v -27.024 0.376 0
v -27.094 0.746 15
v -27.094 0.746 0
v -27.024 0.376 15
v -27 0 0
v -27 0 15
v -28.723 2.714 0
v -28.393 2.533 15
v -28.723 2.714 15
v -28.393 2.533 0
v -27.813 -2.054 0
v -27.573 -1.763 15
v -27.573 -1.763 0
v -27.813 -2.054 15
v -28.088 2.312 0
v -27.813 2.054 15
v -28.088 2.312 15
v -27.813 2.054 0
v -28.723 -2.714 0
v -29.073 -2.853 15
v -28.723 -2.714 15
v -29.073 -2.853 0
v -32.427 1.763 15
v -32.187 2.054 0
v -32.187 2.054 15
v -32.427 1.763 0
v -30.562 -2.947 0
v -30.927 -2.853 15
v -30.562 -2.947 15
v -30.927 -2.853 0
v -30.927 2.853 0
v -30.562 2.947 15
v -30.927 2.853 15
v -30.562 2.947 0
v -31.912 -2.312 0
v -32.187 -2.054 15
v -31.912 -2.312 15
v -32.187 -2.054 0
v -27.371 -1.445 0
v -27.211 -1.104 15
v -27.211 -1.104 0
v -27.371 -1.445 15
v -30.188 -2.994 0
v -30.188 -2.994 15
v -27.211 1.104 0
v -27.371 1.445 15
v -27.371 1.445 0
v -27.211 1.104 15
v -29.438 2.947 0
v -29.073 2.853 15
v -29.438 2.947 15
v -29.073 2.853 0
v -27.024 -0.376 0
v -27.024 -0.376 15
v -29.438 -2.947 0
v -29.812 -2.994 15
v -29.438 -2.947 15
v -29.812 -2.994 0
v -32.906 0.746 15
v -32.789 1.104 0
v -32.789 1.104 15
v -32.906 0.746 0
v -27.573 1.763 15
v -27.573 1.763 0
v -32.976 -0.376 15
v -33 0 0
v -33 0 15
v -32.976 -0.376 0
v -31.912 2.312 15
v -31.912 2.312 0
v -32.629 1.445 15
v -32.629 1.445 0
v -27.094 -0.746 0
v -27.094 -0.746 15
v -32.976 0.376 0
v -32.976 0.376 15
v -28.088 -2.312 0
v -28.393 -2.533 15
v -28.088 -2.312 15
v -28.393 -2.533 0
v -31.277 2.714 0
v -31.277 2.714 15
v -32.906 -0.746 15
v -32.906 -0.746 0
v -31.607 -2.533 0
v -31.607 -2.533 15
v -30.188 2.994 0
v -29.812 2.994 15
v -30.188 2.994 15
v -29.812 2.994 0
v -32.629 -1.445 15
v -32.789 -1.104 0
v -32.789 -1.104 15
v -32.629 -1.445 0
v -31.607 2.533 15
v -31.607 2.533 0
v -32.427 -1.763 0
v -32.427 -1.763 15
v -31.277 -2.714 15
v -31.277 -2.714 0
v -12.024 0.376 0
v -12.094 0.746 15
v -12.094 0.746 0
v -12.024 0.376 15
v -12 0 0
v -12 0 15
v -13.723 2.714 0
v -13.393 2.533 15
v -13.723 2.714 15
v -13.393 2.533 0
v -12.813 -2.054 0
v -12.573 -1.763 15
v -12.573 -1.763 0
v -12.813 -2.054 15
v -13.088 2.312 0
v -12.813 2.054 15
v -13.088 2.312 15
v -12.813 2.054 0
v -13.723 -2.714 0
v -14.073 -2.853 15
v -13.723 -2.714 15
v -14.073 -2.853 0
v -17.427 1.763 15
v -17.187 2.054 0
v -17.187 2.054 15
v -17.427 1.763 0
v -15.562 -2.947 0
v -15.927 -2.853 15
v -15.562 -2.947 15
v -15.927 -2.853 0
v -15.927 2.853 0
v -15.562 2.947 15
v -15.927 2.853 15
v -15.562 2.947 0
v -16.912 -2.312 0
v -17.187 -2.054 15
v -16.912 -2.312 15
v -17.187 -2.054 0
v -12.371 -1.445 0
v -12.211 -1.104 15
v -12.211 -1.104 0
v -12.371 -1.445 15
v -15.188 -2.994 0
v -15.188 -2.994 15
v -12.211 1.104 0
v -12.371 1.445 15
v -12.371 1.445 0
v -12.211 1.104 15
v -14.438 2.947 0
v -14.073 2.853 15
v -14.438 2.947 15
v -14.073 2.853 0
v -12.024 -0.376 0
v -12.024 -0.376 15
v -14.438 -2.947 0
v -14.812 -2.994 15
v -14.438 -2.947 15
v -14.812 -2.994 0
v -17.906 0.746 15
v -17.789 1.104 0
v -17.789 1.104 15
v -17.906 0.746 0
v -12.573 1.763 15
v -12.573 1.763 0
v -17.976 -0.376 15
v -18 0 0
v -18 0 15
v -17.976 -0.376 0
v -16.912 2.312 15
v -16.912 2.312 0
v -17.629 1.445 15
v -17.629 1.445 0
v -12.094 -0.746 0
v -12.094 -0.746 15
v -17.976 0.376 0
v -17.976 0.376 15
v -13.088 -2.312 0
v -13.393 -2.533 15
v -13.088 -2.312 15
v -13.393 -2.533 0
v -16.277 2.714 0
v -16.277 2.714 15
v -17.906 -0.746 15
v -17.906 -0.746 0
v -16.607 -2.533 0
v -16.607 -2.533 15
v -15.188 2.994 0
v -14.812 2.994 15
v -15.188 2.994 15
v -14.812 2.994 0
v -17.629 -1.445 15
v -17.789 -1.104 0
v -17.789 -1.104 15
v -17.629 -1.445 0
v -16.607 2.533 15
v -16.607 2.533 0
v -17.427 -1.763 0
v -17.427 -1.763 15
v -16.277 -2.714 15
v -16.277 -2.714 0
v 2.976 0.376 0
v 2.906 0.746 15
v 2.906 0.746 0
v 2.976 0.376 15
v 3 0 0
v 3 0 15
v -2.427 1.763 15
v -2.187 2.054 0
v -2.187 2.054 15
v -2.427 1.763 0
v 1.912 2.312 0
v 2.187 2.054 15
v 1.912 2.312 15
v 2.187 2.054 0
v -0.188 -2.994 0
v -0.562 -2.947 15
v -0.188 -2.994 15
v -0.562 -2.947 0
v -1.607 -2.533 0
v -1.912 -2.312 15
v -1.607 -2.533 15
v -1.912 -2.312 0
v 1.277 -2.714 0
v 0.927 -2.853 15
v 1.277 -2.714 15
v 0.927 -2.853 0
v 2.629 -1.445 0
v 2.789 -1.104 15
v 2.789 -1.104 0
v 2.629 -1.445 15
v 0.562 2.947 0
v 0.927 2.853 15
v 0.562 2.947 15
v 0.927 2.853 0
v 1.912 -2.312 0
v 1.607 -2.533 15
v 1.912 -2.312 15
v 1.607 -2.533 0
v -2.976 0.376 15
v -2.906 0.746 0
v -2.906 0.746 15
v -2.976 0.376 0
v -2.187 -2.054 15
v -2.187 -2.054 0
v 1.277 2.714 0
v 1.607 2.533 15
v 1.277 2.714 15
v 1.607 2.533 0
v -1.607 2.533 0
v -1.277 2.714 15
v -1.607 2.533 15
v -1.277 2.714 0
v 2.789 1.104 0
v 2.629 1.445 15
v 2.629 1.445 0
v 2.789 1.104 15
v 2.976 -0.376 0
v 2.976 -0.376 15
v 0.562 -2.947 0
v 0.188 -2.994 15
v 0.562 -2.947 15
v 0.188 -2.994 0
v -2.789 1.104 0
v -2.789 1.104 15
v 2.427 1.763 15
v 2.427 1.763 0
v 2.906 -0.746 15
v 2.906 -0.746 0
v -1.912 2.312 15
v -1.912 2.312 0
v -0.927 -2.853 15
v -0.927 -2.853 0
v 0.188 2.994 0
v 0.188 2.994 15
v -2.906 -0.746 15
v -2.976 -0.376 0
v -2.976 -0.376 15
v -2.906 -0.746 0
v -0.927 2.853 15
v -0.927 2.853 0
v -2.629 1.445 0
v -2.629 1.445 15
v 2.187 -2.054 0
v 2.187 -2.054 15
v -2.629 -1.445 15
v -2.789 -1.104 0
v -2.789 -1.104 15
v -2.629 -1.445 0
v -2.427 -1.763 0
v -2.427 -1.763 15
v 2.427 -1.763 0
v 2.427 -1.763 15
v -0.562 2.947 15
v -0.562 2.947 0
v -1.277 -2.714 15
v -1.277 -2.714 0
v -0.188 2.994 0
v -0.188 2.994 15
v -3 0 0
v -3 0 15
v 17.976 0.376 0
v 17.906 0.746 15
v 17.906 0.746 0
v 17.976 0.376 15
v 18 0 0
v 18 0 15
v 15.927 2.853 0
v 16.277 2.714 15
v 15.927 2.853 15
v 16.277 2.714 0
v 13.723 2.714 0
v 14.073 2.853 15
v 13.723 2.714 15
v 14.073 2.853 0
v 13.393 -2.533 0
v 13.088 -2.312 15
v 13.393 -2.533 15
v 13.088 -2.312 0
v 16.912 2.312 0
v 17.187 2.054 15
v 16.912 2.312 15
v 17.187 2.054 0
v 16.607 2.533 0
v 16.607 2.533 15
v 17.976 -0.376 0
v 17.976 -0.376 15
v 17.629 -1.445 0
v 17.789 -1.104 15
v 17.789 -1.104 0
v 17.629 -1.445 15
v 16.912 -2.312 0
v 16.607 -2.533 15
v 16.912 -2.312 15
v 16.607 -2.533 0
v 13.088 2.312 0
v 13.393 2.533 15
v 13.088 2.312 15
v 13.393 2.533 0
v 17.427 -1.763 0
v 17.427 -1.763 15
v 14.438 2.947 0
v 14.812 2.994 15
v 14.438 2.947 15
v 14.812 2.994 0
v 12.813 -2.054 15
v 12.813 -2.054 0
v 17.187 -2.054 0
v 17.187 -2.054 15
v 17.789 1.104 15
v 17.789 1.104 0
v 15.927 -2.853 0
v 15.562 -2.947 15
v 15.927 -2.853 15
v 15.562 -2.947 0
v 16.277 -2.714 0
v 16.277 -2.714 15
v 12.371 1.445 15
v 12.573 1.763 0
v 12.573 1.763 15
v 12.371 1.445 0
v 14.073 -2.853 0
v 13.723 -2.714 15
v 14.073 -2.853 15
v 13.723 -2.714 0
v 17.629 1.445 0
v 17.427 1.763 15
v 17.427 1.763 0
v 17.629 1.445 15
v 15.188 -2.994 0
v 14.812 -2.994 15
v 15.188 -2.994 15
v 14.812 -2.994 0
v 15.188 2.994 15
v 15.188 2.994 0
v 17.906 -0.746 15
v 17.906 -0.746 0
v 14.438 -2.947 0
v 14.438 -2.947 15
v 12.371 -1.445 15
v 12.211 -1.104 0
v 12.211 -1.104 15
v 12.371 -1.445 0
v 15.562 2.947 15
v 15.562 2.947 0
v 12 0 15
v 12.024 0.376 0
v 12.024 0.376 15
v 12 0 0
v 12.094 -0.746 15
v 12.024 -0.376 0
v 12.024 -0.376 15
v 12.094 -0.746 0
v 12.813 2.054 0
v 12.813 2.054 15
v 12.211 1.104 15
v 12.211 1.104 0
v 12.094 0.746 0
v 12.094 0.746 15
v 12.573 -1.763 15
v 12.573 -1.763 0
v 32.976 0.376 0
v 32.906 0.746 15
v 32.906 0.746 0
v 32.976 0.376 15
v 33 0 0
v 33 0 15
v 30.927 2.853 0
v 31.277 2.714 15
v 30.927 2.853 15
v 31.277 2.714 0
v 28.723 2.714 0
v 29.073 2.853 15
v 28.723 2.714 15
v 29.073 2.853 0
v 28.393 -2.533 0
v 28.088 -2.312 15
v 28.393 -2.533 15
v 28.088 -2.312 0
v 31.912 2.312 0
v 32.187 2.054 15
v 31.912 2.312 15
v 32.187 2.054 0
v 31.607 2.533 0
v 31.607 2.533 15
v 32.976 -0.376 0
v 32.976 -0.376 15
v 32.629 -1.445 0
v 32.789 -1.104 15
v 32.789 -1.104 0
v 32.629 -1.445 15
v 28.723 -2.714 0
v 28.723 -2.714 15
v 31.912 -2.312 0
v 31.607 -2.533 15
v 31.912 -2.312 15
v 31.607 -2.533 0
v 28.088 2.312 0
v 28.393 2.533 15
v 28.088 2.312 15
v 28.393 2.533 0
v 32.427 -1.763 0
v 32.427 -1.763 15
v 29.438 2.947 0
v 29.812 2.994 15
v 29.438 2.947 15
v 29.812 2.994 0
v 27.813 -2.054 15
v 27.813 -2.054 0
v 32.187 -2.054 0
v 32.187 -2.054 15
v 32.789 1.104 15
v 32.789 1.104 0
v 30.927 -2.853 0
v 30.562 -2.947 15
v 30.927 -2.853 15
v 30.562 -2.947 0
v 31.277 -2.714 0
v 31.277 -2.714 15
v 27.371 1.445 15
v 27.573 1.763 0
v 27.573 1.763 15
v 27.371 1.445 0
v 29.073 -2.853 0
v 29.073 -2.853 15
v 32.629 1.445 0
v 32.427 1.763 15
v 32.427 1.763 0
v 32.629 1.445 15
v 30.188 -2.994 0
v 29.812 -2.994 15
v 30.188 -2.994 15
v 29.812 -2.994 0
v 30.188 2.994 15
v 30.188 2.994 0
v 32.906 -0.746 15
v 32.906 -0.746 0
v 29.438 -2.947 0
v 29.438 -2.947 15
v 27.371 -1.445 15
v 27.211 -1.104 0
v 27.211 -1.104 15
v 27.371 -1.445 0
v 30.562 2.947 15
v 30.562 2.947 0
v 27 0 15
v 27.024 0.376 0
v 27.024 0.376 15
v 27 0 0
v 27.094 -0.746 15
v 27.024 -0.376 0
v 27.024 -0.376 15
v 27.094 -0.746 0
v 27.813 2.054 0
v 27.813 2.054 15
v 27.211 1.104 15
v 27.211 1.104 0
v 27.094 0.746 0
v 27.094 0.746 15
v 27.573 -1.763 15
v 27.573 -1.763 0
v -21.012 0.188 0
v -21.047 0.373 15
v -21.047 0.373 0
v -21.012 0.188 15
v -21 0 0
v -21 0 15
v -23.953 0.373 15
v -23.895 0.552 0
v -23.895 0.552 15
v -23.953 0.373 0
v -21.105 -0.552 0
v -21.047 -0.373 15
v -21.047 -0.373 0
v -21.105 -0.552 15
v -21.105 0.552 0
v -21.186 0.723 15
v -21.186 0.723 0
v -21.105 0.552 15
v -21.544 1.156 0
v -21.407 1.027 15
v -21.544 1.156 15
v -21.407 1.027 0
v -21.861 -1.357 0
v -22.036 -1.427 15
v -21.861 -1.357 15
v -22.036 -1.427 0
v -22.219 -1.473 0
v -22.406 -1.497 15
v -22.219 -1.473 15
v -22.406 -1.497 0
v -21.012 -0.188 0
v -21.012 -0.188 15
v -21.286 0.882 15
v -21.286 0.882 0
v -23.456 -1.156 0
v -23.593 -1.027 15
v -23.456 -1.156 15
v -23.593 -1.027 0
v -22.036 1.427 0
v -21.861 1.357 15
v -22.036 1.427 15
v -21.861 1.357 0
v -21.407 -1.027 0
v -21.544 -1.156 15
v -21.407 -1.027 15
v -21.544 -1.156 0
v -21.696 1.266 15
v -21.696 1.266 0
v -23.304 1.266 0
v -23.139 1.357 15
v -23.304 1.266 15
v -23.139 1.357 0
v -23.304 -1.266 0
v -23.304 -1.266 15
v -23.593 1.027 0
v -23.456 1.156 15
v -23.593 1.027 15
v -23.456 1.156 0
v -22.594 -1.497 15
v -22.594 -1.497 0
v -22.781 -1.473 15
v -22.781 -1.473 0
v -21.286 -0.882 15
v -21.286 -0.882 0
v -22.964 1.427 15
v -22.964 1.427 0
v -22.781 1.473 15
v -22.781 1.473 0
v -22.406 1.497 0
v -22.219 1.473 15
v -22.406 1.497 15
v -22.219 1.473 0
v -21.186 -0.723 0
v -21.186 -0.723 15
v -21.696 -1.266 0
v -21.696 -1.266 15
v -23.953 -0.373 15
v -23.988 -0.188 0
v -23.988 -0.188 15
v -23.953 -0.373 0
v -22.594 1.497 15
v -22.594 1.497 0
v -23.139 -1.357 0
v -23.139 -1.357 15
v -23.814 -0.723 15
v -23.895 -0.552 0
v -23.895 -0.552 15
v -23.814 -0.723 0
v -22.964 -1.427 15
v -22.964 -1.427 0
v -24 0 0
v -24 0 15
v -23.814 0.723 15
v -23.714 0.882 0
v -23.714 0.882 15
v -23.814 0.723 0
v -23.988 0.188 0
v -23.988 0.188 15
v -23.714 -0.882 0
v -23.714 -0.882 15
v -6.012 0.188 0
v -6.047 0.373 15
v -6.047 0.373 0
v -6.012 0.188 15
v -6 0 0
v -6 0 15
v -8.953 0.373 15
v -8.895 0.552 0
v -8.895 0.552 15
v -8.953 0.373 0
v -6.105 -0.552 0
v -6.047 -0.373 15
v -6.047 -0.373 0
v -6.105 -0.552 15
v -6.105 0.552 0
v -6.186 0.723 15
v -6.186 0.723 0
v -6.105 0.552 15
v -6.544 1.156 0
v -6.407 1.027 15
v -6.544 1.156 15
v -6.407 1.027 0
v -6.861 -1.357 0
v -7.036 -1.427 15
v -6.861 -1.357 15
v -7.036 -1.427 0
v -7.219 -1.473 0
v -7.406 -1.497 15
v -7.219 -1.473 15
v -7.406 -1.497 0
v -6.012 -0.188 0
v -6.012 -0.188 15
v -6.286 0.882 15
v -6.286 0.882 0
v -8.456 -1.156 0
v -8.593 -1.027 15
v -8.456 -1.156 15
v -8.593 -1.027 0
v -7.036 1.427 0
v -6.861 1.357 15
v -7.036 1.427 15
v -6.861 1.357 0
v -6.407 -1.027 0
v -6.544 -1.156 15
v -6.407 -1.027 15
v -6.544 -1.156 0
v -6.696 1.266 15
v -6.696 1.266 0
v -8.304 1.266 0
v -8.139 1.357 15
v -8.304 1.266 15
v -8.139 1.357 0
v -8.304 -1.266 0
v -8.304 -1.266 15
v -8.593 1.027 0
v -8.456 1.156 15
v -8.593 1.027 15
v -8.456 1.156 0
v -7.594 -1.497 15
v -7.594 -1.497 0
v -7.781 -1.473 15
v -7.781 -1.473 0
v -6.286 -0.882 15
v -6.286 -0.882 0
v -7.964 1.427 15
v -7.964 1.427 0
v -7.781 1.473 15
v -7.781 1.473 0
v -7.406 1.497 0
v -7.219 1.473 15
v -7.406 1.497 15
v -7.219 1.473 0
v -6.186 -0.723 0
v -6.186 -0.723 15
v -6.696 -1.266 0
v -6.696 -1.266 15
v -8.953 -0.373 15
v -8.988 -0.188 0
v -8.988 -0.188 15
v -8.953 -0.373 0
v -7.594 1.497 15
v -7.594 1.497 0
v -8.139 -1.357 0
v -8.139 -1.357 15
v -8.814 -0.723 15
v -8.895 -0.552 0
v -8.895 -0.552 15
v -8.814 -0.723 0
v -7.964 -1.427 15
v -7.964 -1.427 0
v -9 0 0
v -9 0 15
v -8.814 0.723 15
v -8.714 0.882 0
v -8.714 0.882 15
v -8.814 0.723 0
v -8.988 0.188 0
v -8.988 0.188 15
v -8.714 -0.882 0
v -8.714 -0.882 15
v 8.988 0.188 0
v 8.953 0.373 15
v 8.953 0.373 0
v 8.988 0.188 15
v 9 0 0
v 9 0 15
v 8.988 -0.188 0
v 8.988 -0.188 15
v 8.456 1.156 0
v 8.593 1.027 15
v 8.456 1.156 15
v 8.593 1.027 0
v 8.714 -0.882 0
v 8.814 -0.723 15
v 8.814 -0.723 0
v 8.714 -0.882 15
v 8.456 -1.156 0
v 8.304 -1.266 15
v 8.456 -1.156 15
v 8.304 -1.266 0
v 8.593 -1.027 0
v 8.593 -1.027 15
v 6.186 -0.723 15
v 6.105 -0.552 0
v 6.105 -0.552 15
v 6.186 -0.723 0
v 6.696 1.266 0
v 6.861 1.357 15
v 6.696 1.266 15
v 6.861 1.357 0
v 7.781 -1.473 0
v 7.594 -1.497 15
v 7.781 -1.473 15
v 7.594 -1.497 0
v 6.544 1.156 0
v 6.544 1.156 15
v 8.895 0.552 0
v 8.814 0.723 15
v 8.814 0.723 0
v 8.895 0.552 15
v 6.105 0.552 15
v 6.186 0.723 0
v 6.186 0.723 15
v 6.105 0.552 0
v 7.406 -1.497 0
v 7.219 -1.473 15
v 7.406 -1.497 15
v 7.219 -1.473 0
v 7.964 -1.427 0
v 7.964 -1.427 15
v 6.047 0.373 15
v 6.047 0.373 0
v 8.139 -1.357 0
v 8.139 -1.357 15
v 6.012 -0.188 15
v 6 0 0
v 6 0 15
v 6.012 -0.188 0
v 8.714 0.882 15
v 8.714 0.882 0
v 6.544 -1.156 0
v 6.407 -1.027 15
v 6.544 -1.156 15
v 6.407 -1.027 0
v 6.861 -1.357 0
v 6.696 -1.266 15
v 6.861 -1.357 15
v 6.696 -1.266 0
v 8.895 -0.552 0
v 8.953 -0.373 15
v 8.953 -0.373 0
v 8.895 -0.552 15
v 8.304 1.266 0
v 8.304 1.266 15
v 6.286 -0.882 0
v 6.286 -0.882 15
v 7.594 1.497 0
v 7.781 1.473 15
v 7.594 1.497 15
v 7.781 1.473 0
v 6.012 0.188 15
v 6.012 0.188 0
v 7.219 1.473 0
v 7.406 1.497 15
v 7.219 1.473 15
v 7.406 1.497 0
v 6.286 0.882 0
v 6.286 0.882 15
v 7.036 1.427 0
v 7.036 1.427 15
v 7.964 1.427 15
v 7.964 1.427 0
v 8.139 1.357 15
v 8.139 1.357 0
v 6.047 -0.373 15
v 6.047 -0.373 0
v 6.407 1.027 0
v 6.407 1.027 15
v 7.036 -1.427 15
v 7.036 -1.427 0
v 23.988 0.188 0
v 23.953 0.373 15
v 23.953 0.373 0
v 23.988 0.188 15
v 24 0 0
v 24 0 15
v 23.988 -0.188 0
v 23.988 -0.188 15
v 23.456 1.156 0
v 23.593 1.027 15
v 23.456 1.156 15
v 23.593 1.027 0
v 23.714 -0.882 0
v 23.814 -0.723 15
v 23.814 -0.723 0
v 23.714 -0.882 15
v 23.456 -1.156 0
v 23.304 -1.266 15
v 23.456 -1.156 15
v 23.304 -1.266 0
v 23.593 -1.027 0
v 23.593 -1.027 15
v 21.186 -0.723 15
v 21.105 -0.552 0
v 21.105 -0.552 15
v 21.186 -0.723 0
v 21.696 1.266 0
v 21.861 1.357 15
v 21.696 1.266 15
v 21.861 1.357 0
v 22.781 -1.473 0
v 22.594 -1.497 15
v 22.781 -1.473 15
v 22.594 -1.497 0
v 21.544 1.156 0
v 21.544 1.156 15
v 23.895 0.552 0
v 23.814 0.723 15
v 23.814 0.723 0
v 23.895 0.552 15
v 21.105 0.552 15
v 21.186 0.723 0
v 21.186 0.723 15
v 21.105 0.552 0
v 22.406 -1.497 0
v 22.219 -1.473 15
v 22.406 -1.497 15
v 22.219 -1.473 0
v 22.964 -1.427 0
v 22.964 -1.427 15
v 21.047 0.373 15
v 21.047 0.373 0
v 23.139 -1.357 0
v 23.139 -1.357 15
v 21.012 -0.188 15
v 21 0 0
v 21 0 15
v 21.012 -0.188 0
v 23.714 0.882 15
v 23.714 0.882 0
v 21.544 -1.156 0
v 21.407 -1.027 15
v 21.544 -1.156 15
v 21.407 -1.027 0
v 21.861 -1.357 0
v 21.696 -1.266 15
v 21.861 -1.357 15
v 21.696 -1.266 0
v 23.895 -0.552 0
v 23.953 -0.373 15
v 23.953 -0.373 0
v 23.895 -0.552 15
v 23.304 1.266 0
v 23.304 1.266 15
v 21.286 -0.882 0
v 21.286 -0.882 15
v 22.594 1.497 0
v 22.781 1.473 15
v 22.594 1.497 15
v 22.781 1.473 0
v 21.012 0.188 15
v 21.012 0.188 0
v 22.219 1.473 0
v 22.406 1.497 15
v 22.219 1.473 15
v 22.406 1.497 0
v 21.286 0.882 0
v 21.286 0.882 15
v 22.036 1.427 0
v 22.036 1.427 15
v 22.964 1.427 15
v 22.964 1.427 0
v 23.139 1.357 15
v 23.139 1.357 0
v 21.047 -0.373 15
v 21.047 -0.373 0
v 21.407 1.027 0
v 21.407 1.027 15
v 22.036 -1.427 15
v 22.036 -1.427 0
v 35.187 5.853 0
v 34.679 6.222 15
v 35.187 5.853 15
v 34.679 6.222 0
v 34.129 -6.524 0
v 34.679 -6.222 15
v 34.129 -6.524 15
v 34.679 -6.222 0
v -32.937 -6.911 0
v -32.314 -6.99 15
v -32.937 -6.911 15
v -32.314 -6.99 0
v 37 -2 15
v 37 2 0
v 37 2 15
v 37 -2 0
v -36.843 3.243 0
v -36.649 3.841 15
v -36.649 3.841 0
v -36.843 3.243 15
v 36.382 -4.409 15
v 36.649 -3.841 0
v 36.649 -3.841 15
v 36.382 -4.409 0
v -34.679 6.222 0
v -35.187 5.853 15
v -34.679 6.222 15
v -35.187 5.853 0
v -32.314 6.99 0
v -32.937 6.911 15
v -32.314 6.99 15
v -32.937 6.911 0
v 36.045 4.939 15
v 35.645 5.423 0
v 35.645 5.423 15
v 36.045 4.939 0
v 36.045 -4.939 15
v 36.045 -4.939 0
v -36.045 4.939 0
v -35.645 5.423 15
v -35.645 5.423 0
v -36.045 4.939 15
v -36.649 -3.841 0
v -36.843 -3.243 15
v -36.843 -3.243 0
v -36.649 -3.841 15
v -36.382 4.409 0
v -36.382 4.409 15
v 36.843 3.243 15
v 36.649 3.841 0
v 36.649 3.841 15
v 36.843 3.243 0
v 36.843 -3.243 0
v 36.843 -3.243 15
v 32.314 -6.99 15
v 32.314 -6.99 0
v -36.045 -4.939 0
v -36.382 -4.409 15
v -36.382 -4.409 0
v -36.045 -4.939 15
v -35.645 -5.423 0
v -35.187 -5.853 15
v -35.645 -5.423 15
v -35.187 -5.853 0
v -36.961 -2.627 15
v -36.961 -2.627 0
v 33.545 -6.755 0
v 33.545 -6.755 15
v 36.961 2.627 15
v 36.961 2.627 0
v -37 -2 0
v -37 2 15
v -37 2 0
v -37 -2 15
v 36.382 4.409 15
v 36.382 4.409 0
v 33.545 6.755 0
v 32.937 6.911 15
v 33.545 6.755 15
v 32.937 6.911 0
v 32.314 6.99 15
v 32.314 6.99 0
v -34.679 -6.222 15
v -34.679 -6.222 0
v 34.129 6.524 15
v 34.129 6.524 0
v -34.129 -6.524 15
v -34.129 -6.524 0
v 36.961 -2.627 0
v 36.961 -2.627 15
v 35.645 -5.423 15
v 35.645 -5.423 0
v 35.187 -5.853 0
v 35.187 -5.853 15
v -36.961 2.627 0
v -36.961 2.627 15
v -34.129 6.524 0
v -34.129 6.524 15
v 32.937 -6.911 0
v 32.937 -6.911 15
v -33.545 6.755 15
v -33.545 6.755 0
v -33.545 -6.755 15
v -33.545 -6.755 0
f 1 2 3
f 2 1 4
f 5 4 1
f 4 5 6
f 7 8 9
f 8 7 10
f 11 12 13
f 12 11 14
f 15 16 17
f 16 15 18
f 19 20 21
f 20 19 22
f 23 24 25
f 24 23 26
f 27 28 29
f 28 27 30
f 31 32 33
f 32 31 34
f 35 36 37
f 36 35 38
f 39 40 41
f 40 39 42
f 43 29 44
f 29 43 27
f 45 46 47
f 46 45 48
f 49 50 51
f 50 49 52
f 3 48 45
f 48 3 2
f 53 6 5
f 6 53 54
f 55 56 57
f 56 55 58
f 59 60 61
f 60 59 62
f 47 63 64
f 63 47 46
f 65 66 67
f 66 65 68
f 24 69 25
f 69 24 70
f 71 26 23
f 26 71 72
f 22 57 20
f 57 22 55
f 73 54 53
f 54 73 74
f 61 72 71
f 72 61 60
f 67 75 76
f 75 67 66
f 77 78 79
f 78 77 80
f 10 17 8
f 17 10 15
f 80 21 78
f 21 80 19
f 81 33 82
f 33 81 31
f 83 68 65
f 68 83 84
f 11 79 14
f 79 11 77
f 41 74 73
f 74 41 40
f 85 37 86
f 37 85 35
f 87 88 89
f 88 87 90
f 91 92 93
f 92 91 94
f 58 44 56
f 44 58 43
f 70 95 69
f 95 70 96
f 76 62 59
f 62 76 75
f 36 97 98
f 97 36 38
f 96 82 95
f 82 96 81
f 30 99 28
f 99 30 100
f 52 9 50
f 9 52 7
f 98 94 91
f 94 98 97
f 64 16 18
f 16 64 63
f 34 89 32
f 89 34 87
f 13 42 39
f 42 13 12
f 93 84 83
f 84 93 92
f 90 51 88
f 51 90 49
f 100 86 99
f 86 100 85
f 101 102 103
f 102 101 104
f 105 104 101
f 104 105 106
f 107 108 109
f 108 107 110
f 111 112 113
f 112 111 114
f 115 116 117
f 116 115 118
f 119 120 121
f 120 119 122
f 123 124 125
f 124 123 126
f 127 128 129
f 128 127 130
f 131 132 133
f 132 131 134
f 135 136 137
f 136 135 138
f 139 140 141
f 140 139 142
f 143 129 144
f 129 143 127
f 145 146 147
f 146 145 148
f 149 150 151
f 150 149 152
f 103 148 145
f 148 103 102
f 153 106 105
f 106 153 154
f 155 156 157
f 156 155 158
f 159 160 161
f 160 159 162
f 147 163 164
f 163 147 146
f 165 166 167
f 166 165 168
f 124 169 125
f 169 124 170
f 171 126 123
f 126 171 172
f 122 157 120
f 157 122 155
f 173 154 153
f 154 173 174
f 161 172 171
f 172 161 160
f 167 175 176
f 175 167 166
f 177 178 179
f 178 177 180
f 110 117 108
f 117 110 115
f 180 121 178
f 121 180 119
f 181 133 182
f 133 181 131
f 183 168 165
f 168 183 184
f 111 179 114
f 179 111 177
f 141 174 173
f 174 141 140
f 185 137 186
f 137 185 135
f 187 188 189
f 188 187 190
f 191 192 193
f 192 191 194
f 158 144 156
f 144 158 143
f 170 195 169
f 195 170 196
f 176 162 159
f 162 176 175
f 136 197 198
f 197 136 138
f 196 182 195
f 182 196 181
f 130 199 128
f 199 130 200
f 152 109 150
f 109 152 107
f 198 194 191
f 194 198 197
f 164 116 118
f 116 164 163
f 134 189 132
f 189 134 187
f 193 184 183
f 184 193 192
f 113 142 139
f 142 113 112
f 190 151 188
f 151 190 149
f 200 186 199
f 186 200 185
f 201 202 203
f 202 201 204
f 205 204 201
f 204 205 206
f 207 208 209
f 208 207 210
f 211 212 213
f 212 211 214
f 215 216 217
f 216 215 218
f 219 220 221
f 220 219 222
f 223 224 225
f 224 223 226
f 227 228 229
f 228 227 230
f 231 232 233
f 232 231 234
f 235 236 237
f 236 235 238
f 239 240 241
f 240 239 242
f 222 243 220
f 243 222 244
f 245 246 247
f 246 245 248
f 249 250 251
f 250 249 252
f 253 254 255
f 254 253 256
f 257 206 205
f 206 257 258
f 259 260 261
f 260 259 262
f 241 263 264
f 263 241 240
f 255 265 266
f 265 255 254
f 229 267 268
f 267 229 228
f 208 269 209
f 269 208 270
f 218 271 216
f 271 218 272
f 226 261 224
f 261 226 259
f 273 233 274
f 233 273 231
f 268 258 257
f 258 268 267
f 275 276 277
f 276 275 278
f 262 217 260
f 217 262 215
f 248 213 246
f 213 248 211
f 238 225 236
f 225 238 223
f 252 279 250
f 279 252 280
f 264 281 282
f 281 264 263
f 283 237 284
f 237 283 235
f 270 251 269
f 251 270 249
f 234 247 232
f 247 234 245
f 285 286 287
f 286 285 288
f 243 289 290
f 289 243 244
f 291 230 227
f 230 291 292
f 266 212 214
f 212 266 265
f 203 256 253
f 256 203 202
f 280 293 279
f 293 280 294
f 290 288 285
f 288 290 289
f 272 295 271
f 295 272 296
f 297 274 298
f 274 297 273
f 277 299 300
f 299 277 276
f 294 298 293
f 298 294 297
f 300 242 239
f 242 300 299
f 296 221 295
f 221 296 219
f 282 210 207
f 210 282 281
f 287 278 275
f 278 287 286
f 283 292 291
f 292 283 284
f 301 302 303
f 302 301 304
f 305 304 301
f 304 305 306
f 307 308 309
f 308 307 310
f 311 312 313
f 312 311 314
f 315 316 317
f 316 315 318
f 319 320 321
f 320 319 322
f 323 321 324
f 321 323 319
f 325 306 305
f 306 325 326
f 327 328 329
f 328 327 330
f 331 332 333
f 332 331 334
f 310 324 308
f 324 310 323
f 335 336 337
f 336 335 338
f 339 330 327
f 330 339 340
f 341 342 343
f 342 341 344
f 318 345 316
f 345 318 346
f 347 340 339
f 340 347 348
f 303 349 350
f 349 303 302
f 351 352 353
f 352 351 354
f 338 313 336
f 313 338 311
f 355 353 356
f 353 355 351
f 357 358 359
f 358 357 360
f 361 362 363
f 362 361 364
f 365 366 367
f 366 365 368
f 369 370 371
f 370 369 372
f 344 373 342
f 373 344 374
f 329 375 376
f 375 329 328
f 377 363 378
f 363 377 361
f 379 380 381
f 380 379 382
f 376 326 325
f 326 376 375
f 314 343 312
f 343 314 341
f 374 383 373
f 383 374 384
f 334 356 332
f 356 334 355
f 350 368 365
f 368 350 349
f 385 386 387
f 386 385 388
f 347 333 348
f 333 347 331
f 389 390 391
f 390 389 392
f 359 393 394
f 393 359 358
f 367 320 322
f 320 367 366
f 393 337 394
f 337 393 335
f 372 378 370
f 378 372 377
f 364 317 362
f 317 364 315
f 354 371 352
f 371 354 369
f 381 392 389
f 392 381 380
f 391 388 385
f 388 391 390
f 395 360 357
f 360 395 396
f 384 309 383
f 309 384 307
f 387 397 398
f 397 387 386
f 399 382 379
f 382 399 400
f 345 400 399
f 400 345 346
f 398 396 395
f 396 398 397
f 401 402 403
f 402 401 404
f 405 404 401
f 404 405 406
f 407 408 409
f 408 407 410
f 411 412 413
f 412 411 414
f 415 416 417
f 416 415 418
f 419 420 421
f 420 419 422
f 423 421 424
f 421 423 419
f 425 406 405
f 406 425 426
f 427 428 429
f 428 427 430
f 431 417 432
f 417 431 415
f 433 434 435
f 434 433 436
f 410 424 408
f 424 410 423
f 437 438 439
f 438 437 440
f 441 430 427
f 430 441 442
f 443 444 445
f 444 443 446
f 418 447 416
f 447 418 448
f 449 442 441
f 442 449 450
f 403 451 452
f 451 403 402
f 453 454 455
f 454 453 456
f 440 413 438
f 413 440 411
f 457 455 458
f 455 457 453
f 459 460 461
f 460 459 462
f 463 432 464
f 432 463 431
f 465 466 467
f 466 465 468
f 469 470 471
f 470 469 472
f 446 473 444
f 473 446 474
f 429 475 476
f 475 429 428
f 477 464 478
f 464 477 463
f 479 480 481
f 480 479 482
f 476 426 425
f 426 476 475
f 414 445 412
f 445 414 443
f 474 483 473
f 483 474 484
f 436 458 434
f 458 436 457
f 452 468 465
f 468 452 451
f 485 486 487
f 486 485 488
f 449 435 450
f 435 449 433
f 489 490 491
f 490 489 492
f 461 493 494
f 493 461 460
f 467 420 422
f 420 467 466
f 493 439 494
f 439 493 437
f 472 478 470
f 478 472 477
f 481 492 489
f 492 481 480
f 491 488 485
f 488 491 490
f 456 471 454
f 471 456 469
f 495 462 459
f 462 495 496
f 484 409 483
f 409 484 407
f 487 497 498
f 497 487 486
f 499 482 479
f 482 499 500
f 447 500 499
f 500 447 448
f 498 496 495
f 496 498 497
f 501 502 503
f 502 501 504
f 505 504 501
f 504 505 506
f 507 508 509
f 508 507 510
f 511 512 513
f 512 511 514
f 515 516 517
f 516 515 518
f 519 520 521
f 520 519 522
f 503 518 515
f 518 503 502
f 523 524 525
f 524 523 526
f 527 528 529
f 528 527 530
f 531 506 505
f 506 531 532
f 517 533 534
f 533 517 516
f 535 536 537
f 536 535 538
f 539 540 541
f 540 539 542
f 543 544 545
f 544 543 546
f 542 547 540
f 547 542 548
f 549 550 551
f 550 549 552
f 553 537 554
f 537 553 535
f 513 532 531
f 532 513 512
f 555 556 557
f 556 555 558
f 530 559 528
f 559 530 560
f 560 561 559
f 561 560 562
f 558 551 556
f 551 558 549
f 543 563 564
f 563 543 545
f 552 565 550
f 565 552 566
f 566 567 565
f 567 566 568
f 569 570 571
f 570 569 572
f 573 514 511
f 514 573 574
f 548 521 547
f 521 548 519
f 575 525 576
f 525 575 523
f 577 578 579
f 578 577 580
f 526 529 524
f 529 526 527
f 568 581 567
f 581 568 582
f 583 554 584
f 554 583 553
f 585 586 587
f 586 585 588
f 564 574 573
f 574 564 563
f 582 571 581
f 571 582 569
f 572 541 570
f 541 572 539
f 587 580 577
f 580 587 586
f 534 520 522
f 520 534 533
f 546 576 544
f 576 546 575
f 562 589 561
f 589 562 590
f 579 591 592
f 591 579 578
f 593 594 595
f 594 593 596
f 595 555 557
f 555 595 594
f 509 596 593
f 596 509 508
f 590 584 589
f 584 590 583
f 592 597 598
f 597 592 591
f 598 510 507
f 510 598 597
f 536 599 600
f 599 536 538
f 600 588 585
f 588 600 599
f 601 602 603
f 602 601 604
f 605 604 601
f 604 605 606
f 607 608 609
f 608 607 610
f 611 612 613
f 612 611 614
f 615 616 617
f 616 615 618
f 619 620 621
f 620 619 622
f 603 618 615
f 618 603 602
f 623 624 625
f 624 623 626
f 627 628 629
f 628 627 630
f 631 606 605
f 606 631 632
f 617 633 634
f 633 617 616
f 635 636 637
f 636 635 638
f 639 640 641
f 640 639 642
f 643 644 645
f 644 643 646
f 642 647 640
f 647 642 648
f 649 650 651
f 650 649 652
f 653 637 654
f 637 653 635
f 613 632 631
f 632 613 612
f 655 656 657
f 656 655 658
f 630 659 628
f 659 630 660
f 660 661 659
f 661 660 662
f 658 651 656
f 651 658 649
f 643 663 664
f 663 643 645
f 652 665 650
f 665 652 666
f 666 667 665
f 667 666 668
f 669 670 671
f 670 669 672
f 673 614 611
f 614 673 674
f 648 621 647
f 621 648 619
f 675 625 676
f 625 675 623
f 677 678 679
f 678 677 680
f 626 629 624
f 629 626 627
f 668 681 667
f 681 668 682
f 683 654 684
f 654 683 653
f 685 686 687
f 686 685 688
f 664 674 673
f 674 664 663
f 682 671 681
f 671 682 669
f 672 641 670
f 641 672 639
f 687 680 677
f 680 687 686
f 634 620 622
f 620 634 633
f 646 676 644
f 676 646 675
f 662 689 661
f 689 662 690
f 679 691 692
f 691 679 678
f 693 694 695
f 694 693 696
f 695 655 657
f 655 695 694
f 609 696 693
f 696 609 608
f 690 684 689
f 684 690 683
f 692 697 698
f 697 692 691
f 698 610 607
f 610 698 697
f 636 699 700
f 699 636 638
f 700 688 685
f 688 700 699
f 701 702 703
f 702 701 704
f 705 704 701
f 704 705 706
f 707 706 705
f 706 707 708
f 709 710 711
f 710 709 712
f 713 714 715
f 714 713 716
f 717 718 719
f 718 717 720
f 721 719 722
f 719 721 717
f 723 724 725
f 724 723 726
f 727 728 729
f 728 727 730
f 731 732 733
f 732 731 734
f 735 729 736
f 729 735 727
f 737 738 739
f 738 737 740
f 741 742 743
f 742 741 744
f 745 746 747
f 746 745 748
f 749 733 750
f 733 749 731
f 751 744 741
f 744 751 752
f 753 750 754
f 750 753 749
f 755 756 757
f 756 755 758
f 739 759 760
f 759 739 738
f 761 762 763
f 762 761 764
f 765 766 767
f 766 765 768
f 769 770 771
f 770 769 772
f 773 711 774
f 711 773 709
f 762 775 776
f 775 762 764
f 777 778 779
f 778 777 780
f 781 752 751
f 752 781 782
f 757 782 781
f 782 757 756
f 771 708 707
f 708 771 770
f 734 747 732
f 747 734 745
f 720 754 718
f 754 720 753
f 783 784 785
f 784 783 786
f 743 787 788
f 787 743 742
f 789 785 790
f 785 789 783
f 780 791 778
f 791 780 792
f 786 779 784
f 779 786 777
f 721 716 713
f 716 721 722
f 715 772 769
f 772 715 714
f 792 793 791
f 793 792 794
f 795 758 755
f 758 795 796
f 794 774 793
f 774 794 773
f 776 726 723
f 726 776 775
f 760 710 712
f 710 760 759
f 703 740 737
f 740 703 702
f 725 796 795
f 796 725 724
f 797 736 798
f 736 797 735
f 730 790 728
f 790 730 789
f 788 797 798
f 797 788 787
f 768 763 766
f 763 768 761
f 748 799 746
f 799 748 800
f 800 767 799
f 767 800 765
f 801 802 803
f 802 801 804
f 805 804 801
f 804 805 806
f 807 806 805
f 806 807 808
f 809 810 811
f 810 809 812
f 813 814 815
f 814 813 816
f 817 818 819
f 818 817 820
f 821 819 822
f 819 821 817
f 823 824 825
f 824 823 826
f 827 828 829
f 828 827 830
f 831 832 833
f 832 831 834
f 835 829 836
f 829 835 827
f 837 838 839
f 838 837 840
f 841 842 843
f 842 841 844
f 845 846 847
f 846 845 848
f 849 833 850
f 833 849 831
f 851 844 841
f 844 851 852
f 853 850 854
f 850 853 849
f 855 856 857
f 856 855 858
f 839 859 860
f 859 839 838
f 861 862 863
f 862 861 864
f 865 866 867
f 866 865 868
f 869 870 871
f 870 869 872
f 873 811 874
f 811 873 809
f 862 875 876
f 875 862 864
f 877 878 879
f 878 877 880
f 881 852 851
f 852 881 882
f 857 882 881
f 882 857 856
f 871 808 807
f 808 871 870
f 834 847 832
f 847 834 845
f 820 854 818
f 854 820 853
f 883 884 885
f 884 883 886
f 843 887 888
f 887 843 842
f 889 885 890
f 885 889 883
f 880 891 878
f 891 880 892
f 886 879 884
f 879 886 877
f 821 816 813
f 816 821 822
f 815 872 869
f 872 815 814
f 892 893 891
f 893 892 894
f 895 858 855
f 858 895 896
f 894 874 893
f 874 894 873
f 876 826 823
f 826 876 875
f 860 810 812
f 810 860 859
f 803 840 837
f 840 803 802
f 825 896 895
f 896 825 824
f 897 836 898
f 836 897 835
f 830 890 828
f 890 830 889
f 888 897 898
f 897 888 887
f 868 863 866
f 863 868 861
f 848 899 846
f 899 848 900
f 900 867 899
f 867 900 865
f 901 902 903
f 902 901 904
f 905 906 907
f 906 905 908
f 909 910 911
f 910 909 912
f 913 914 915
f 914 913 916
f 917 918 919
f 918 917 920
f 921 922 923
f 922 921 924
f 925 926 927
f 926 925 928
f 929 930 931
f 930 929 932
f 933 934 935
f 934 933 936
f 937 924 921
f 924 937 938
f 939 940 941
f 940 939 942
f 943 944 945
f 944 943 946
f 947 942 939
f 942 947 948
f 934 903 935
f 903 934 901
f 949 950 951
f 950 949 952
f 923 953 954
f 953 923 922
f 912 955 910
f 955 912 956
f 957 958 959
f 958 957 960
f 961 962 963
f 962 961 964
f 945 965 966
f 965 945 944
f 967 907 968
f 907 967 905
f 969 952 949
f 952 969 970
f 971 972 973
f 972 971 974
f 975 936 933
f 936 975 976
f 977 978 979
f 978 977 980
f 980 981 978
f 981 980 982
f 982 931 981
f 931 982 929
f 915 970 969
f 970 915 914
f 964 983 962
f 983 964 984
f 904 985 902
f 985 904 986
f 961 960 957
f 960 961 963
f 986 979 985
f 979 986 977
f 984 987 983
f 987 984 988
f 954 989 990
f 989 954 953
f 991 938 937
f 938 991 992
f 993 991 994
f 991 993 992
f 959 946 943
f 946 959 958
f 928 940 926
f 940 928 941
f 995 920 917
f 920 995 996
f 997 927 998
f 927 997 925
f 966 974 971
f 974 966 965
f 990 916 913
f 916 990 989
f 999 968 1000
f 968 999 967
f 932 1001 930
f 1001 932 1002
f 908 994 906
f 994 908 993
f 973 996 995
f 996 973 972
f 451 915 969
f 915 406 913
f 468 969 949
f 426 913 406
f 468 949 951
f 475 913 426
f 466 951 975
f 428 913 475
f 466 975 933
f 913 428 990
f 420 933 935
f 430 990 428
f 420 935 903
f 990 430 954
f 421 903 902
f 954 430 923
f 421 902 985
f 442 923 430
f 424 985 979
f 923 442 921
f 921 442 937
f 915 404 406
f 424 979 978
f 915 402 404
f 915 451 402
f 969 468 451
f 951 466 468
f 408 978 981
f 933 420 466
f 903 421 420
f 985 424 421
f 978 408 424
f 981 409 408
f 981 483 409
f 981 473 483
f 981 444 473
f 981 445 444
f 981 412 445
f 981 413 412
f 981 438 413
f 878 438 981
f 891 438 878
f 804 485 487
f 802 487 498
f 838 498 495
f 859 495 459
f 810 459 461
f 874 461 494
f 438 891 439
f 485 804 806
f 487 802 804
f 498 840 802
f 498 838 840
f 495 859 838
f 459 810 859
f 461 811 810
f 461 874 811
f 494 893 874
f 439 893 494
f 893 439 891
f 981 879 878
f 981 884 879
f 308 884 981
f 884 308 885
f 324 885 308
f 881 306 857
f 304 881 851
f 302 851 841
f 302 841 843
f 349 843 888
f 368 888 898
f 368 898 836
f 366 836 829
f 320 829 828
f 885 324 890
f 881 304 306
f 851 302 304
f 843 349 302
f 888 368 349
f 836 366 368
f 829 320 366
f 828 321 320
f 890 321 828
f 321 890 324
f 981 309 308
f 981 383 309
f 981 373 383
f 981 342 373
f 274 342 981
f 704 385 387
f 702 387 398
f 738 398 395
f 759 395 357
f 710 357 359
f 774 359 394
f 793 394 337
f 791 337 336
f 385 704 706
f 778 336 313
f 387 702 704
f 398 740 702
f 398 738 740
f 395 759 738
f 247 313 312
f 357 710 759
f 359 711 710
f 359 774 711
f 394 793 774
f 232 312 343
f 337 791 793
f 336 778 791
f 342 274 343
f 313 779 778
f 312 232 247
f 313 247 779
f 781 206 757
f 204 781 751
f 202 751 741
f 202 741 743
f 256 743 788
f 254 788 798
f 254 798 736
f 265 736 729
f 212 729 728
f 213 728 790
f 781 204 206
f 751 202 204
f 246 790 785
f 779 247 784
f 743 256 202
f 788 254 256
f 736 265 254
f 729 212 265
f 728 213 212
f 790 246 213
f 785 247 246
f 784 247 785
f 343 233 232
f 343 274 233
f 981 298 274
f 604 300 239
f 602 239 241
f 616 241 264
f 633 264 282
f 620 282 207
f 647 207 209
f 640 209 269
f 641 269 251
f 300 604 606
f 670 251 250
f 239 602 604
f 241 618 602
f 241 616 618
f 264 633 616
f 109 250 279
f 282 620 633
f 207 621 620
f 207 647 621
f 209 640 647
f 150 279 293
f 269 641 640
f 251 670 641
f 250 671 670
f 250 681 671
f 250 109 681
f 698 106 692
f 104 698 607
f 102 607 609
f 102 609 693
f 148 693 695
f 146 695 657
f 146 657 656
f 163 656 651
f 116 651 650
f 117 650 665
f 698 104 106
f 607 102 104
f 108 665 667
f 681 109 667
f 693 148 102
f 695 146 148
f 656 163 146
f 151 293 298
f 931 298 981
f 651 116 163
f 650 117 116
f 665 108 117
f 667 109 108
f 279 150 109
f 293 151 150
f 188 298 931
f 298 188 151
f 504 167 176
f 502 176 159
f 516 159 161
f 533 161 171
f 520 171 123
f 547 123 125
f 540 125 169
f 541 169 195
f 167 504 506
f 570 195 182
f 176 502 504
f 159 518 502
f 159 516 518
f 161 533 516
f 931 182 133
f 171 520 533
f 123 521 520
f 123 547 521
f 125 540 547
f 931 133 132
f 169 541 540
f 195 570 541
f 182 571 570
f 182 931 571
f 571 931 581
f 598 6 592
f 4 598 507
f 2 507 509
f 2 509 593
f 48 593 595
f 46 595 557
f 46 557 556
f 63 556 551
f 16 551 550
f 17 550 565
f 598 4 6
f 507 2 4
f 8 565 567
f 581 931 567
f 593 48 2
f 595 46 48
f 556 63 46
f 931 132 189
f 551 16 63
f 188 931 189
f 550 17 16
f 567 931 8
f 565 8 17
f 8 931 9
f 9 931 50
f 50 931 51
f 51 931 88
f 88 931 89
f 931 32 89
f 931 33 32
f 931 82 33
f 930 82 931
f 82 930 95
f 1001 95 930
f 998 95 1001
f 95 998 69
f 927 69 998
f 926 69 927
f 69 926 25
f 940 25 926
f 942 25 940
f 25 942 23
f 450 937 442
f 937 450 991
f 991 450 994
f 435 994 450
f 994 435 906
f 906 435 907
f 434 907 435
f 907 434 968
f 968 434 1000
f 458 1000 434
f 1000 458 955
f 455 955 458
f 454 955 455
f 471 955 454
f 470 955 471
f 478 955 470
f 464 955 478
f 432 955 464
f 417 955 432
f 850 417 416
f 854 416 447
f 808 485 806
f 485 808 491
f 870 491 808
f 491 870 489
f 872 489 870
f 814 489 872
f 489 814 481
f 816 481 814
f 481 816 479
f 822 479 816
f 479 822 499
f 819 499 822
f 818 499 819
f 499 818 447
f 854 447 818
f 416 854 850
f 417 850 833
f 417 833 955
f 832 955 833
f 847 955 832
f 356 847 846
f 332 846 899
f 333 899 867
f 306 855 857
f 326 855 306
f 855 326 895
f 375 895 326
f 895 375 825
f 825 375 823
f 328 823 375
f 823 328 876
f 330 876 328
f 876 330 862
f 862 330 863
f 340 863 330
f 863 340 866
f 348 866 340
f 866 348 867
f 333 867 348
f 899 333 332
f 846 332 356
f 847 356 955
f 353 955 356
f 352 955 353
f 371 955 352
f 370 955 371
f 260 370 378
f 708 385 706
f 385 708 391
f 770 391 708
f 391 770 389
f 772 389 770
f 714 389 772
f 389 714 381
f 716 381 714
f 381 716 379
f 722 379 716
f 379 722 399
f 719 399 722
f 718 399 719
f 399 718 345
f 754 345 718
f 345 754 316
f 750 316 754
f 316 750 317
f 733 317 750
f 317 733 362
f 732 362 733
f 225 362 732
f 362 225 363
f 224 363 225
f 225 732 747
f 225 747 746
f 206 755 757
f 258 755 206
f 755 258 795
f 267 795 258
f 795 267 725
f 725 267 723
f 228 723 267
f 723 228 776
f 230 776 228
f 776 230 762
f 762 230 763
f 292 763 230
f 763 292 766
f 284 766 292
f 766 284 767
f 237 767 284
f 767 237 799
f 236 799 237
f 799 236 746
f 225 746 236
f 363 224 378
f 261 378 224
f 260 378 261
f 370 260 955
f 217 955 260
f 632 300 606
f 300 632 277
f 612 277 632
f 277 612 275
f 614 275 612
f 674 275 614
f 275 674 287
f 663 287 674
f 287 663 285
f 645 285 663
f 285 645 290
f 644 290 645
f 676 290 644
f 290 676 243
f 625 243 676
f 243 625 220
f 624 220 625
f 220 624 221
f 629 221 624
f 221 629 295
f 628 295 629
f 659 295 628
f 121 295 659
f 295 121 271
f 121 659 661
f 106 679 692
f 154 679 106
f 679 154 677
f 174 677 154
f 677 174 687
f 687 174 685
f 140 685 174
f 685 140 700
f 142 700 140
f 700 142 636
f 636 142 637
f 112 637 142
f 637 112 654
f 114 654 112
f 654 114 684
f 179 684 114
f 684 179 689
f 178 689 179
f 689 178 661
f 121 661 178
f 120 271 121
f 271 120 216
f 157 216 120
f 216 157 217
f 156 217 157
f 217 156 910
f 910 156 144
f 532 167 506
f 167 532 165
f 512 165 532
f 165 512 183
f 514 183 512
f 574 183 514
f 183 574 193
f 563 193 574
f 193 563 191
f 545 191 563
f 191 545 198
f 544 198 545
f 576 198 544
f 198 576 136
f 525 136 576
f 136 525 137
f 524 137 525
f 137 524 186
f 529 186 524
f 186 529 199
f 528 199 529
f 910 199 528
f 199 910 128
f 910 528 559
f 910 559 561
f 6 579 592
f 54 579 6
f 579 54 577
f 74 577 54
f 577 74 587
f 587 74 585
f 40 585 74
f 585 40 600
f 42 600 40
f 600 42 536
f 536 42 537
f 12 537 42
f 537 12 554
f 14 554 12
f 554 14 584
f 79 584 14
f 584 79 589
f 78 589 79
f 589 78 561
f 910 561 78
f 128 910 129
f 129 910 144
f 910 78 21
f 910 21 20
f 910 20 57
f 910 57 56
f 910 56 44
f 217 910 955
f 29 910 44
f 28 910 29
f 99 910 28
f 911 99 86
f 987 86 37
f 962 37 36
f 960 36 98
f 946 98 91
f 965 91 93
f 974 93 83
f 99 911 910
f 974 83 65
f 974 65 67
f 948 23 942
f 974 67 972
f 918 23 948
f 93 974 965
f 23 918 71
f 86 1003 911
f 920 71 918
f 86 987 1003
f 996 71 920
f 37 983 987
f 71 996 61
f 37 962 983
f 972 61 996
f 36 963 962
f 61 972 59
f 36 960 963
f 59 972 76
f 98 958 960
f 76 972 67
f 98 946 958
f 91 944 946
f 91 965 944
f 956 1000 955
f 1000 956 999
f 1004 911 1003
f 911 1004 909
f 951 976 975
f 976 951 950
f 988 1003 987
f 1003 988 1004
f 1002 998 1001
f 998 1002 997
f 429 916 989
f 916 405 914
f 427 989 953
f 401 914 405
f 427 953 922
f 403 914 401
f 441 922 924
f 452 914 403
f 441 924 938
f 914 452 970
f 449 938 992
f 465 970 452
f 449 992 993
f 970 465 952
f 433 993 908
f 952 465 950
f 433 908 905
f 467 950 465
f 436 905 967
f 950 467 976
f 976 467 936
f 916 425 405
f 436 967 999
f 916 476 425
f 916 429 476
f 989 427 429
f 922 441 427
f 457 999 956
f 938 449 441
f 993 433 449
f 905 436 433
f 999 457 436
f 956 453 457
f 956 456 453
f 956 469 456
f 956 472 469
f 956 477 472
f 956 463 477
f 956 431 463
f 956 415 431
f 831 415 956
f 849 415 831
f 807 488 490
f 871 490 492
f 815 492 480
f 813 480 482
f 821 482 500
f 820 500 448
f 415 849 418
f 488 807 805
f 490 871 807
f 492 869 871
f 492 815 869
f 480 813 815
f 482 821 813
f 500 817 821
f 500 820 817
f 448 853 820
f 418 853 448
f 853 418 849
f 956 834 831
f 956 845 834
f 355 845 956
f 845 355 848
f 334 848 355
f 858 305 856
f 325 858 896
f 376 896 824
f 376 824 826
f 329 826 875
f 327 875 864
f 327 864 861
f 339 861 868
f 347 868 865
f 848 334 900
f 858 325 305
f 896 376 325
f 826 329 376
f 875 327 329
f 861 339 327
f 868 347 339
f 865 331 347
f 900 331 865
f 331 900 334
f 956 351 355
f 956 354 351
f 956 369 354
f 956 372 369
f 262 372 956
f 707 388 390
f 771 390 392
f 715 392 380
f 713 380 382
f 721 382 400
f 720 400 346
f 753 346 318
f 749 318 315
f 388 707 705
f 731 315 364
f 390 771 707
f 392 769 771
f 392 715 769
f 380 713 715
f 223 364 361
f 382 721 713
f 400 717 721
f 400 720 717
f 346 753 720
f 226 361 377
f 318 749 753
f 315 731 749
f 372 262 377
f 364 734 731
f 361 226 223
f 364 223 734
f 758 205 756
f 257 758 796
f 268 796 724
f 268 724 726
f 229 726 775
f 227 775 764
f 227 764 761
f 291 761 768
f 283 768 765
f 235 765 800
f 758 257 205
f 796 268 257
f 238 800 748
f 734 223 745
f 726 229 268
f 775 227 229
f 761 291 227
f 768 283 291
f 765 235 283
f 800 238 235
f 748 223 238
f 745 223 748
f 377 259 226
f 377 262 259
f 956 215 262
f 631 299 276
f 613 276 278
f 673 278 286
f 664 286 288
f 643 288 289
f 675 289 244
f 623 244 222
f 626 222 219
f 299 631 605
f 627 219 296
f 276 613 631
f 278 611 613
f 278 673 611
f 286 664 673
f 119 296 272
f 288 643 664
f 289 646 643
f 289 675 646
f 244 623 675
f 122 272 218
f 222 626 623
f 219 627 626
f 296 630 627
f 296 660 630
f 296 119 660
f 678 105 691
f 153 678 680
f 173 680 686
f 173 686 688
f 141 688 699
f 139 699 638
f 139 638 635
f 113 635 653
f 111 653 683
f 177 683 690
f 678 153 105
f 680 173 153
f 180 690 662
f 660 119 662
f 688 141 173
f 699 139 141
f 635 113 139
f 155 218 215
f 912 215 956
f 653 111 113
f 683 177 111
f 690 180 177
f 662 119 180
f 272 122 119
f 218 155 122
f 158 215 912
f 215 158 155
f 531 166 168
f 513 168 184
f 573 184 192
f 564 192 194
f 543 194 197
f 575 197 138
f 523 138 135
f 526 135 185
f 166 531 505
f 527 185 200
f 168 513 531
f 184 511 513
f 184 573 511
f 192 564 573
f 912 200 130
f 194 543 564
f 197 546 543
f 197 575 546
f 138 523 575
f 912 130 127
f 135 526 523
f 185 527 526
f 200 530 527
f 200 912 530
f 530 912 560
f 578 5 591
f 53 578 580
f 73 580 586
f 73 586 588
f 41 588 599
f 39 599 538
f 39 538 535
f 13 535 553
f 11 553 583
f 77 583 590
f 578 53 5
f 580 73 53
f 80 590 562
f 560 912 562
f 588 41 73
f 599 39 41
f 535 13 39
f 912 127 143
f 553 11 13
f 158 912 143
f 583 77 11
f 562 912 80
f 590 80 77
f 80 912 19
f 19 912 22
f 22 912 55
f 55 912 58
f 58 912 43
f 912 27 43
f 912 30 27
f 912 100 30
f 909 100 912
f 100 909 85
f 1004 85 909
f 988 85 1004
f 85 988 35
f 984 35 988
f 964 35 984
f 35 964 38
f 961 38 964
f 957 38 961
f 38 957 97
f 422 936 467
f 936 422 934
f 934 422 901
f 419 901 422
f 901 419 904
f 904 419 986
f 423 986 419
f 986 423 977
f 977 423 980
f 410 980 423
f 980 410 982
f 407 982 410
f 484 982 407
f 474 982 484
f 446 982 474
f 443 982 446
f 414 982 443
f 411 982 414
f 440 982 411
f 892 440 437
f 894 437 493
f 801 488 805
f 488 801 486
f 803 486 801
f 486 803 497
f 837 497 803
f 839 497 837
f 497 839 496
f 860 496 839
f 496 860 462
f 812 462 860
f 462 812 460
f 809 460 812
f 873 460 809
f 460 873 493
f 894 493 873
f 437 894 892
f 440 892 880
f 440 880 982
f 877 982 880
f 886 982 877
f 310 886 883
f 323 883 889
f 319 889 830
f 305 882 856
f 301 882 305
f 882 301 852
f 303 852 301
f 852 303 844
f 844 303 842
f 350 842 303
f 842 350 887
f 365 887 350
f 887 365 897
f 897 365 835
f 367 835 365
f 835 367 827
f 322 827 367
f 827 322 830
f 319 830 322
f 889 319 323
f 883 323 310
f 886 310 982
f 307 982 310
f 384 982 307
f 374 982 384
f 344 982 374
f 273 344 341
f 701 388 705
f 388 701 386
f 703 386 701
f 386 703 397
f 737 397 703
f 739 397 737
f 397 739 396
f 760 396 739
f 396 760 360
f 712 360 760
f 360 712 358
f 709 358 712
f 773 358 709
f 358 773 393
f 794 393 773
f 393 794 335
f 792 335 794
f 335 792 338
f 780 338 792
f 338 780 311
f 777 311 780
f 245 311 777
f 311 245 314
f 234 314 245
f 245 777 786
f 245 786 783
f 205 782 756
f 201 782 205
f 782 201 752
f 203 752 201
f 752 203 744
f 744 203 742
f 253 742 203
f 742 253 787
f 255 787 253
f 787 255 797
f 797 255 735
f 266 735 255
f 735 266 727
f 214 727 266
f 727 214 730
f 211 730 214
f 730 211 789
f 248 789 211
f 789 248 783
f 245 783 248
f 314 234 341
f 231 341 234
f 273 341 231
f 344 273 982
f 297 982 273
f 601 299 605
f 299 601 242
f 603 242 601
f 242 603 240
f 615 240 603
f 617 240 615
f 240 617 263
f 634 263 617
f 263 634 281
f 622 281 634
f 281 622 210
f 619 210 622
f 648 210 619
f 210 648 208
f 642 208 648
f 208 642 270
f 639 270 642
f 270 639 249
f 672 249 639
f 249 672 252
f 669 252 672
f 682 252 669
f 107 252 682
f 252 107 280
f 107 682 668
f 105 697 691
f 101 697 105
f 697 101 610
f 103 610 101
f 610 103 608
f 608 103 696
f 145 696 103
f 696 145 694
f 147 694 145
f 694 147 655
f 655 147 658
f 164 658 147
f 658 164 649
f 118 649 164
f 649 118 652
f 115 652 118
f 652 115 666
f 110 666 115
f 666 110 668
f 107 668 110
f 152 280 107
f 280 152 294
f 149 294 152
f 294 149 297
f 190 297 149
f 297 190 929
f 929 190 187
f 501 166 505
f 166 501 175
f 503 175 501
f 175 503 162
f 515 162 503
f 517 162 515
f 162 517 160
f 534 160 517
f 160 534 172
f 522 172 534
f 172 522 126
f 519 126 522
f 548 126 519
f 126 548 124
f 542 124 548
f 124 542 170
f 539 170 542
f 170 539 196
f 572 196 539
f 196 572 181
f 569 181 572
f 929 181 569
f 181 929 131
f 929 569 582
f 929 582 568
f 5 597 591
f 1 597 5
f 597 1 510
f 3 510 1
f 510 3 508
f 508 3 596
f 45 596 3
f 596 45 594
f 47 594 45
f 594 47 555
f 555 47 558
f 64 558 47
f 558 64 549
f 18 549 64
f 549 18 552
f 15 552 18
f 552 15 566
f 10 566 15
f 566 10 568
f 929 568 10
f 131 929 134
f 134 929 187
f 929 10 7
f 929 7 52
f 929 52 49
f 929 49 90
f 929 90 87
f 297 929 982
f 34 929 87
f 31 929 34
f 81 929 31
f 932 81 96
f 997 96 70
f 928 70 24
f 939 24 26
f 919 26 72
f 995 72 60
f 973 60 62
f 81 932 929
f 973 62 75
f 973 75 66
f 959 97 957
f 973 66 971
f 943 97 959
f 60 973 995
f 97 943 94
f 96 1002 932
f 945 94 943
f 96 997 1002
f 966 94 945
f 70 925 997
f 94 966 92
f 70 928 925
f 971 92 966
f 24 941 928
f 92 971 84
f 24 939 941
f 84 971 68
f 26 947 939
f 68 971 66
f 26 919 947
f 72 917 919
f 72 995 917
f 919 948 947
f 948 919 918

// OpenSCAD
$fn = 50;


difference() {
	union() {
		*color(alpha = 1.0000000000, c = "gray") {
			translate(v = [0, 7, 0]) {
				linear_extrude(height = 1) {
					text(font = "Arial:style=Bold", halign = "center", size = 4.5000000000, text = "COMMENT plate main", valign = "center");
				}
			}
		}
		*color(alpha = 1.0000000000, c = "gray") {
			translate(v = [0, 14, 0]) {
				linear_extrude(height = 1) {
					text(font = "Arial:style=Bold", halign = "center", size = 4.5000000000, text = "COMMENT description oobb_plate_shape_p_type_15_depth_5_width_1_height_15_thickness_true_both_holes", valign = "center");
				}
			}
		}
		hull() {
			translate(v = [-32.0000000000, 2.0000000000, 0]) {
				cylinder(h = 15, r = 5);
			}
			translate(v = [32.0000000000, 2.0000000000, 0]) {
				cylinder(h = 15, r = 5);
			}
			translate(v = [-32.0000000000, -2.0000000000, 0]) {
				cylinder(h = 15, r = 5);
			}
			translate(v = [32.0000000000, -2.0000000000, 0]) {
				cylinder(h = 15, r = 5);
			}
		}
	}
	union() {
		*color(alpha = 1.0000000000, c = "gray") {
			translate(v = [0, 7, 0]) {
				linear_extrude(height = 1) {
					text(font = "Arial:style=Bold", halign = "center", size = 4.5000000000, text = "COMMENT holes main", valign = "center");
				}
			}
		}
		*color(alpha = 1.0000000000, c = "gray") {
			translate(v = [0, 14, 0]) {
				linear_extrude(height = 1) {
					text(font = "Arial:style=Bold", halign = "center", size = 4.5000000000, text = "COMMENT description oobb_holes_shape_n_type_5_width_1_height_15_thickness_true_both_holes", valign = "center");
				}
			}
		}
		translate(v = [-30.0000000000, 0.0000000000, 0]) {
			translate(v = [0, 0, -50]) {
				cylinder(h = 100, r = 3.0000000000);
			}
		}
		translate(v = [-15.0000000000, 0.0000000000, 0]) {
			translate(v = [0, 0, -50]) {
				cylinder(h = 100, r = 3.0000000000);
			}
		}
		translate(v = [0, 0, -50]) {
			cylinder(h = 100, r = 3.0000000000);
		}
		translate(v = [15.0000000000, 0.0000000000, 0]) {
			translate(v = [0, 0, -50]) {
				cylinder(h = 100, r = 3.0000000000);
			}
		}
		translate(v = [30.0000000000, 0.0000000000, 0]) {
			translate(v = [0, 0, -50]) {
				cylinder(h = 100, r = 3.0000000000);
			}
		}
		translate(v = [-30.0000000000, 0.0000000000, 0]) {
			translate(v = [0, 0, -50]) {
				cylinder(h = 100, r = 1.5000000000);
			}
		}
		translate(v = [-22.5000000000, 0.0000000000, 0]) {
			translate(v = [0, 0, -50]) {
				cylinder(h = 100, r = 1.5000000000);
			}
		}
		translate(v = [-15.0000000000, 0.0000000000, 0]) {
			translate(v = [0, 0, -50]) {
				cylinder(h = 100, r = 1.5000000000);
			}
		}
		translate(v = [-7.5000000000, 0.0000000000, 0]) {
			translate(v = [0, 0, -50]) {
				cylinder(h = 100, r = 1.5000000000);
			}
		}
		translate(v = [0, 0, -50]) {
			cylinder(h = 100, r = 1.5000000000);
		}
		translate(v = [7.5000000000, 0.0000000000, 0]) {
			translate(v = [0, 0, -50]) {
				cylinder(h = 100, r = 1.5000000000);
			}
		}
		translate(v = [15.0000000000, 0.0000000000, 0]) {
			translate(v = [0, 0, -50]) {
				cylinder(h = 100, r = 1.5000000000);
			}
		}
		translate(v = [22.5000000000, 0.0000000000, 0]) {
			translate(v = [0, 0, -50]) {
				cylinder(h = 100, r = 1.5000000000);
			}
		}
		translate(v = [30.0000000000, 0.0000000000, 0]) {
			translate(v = [0, 0, -50]) {
				cylinder(h = 100, r = 1.5000000000);
			}
		}
	}
}
